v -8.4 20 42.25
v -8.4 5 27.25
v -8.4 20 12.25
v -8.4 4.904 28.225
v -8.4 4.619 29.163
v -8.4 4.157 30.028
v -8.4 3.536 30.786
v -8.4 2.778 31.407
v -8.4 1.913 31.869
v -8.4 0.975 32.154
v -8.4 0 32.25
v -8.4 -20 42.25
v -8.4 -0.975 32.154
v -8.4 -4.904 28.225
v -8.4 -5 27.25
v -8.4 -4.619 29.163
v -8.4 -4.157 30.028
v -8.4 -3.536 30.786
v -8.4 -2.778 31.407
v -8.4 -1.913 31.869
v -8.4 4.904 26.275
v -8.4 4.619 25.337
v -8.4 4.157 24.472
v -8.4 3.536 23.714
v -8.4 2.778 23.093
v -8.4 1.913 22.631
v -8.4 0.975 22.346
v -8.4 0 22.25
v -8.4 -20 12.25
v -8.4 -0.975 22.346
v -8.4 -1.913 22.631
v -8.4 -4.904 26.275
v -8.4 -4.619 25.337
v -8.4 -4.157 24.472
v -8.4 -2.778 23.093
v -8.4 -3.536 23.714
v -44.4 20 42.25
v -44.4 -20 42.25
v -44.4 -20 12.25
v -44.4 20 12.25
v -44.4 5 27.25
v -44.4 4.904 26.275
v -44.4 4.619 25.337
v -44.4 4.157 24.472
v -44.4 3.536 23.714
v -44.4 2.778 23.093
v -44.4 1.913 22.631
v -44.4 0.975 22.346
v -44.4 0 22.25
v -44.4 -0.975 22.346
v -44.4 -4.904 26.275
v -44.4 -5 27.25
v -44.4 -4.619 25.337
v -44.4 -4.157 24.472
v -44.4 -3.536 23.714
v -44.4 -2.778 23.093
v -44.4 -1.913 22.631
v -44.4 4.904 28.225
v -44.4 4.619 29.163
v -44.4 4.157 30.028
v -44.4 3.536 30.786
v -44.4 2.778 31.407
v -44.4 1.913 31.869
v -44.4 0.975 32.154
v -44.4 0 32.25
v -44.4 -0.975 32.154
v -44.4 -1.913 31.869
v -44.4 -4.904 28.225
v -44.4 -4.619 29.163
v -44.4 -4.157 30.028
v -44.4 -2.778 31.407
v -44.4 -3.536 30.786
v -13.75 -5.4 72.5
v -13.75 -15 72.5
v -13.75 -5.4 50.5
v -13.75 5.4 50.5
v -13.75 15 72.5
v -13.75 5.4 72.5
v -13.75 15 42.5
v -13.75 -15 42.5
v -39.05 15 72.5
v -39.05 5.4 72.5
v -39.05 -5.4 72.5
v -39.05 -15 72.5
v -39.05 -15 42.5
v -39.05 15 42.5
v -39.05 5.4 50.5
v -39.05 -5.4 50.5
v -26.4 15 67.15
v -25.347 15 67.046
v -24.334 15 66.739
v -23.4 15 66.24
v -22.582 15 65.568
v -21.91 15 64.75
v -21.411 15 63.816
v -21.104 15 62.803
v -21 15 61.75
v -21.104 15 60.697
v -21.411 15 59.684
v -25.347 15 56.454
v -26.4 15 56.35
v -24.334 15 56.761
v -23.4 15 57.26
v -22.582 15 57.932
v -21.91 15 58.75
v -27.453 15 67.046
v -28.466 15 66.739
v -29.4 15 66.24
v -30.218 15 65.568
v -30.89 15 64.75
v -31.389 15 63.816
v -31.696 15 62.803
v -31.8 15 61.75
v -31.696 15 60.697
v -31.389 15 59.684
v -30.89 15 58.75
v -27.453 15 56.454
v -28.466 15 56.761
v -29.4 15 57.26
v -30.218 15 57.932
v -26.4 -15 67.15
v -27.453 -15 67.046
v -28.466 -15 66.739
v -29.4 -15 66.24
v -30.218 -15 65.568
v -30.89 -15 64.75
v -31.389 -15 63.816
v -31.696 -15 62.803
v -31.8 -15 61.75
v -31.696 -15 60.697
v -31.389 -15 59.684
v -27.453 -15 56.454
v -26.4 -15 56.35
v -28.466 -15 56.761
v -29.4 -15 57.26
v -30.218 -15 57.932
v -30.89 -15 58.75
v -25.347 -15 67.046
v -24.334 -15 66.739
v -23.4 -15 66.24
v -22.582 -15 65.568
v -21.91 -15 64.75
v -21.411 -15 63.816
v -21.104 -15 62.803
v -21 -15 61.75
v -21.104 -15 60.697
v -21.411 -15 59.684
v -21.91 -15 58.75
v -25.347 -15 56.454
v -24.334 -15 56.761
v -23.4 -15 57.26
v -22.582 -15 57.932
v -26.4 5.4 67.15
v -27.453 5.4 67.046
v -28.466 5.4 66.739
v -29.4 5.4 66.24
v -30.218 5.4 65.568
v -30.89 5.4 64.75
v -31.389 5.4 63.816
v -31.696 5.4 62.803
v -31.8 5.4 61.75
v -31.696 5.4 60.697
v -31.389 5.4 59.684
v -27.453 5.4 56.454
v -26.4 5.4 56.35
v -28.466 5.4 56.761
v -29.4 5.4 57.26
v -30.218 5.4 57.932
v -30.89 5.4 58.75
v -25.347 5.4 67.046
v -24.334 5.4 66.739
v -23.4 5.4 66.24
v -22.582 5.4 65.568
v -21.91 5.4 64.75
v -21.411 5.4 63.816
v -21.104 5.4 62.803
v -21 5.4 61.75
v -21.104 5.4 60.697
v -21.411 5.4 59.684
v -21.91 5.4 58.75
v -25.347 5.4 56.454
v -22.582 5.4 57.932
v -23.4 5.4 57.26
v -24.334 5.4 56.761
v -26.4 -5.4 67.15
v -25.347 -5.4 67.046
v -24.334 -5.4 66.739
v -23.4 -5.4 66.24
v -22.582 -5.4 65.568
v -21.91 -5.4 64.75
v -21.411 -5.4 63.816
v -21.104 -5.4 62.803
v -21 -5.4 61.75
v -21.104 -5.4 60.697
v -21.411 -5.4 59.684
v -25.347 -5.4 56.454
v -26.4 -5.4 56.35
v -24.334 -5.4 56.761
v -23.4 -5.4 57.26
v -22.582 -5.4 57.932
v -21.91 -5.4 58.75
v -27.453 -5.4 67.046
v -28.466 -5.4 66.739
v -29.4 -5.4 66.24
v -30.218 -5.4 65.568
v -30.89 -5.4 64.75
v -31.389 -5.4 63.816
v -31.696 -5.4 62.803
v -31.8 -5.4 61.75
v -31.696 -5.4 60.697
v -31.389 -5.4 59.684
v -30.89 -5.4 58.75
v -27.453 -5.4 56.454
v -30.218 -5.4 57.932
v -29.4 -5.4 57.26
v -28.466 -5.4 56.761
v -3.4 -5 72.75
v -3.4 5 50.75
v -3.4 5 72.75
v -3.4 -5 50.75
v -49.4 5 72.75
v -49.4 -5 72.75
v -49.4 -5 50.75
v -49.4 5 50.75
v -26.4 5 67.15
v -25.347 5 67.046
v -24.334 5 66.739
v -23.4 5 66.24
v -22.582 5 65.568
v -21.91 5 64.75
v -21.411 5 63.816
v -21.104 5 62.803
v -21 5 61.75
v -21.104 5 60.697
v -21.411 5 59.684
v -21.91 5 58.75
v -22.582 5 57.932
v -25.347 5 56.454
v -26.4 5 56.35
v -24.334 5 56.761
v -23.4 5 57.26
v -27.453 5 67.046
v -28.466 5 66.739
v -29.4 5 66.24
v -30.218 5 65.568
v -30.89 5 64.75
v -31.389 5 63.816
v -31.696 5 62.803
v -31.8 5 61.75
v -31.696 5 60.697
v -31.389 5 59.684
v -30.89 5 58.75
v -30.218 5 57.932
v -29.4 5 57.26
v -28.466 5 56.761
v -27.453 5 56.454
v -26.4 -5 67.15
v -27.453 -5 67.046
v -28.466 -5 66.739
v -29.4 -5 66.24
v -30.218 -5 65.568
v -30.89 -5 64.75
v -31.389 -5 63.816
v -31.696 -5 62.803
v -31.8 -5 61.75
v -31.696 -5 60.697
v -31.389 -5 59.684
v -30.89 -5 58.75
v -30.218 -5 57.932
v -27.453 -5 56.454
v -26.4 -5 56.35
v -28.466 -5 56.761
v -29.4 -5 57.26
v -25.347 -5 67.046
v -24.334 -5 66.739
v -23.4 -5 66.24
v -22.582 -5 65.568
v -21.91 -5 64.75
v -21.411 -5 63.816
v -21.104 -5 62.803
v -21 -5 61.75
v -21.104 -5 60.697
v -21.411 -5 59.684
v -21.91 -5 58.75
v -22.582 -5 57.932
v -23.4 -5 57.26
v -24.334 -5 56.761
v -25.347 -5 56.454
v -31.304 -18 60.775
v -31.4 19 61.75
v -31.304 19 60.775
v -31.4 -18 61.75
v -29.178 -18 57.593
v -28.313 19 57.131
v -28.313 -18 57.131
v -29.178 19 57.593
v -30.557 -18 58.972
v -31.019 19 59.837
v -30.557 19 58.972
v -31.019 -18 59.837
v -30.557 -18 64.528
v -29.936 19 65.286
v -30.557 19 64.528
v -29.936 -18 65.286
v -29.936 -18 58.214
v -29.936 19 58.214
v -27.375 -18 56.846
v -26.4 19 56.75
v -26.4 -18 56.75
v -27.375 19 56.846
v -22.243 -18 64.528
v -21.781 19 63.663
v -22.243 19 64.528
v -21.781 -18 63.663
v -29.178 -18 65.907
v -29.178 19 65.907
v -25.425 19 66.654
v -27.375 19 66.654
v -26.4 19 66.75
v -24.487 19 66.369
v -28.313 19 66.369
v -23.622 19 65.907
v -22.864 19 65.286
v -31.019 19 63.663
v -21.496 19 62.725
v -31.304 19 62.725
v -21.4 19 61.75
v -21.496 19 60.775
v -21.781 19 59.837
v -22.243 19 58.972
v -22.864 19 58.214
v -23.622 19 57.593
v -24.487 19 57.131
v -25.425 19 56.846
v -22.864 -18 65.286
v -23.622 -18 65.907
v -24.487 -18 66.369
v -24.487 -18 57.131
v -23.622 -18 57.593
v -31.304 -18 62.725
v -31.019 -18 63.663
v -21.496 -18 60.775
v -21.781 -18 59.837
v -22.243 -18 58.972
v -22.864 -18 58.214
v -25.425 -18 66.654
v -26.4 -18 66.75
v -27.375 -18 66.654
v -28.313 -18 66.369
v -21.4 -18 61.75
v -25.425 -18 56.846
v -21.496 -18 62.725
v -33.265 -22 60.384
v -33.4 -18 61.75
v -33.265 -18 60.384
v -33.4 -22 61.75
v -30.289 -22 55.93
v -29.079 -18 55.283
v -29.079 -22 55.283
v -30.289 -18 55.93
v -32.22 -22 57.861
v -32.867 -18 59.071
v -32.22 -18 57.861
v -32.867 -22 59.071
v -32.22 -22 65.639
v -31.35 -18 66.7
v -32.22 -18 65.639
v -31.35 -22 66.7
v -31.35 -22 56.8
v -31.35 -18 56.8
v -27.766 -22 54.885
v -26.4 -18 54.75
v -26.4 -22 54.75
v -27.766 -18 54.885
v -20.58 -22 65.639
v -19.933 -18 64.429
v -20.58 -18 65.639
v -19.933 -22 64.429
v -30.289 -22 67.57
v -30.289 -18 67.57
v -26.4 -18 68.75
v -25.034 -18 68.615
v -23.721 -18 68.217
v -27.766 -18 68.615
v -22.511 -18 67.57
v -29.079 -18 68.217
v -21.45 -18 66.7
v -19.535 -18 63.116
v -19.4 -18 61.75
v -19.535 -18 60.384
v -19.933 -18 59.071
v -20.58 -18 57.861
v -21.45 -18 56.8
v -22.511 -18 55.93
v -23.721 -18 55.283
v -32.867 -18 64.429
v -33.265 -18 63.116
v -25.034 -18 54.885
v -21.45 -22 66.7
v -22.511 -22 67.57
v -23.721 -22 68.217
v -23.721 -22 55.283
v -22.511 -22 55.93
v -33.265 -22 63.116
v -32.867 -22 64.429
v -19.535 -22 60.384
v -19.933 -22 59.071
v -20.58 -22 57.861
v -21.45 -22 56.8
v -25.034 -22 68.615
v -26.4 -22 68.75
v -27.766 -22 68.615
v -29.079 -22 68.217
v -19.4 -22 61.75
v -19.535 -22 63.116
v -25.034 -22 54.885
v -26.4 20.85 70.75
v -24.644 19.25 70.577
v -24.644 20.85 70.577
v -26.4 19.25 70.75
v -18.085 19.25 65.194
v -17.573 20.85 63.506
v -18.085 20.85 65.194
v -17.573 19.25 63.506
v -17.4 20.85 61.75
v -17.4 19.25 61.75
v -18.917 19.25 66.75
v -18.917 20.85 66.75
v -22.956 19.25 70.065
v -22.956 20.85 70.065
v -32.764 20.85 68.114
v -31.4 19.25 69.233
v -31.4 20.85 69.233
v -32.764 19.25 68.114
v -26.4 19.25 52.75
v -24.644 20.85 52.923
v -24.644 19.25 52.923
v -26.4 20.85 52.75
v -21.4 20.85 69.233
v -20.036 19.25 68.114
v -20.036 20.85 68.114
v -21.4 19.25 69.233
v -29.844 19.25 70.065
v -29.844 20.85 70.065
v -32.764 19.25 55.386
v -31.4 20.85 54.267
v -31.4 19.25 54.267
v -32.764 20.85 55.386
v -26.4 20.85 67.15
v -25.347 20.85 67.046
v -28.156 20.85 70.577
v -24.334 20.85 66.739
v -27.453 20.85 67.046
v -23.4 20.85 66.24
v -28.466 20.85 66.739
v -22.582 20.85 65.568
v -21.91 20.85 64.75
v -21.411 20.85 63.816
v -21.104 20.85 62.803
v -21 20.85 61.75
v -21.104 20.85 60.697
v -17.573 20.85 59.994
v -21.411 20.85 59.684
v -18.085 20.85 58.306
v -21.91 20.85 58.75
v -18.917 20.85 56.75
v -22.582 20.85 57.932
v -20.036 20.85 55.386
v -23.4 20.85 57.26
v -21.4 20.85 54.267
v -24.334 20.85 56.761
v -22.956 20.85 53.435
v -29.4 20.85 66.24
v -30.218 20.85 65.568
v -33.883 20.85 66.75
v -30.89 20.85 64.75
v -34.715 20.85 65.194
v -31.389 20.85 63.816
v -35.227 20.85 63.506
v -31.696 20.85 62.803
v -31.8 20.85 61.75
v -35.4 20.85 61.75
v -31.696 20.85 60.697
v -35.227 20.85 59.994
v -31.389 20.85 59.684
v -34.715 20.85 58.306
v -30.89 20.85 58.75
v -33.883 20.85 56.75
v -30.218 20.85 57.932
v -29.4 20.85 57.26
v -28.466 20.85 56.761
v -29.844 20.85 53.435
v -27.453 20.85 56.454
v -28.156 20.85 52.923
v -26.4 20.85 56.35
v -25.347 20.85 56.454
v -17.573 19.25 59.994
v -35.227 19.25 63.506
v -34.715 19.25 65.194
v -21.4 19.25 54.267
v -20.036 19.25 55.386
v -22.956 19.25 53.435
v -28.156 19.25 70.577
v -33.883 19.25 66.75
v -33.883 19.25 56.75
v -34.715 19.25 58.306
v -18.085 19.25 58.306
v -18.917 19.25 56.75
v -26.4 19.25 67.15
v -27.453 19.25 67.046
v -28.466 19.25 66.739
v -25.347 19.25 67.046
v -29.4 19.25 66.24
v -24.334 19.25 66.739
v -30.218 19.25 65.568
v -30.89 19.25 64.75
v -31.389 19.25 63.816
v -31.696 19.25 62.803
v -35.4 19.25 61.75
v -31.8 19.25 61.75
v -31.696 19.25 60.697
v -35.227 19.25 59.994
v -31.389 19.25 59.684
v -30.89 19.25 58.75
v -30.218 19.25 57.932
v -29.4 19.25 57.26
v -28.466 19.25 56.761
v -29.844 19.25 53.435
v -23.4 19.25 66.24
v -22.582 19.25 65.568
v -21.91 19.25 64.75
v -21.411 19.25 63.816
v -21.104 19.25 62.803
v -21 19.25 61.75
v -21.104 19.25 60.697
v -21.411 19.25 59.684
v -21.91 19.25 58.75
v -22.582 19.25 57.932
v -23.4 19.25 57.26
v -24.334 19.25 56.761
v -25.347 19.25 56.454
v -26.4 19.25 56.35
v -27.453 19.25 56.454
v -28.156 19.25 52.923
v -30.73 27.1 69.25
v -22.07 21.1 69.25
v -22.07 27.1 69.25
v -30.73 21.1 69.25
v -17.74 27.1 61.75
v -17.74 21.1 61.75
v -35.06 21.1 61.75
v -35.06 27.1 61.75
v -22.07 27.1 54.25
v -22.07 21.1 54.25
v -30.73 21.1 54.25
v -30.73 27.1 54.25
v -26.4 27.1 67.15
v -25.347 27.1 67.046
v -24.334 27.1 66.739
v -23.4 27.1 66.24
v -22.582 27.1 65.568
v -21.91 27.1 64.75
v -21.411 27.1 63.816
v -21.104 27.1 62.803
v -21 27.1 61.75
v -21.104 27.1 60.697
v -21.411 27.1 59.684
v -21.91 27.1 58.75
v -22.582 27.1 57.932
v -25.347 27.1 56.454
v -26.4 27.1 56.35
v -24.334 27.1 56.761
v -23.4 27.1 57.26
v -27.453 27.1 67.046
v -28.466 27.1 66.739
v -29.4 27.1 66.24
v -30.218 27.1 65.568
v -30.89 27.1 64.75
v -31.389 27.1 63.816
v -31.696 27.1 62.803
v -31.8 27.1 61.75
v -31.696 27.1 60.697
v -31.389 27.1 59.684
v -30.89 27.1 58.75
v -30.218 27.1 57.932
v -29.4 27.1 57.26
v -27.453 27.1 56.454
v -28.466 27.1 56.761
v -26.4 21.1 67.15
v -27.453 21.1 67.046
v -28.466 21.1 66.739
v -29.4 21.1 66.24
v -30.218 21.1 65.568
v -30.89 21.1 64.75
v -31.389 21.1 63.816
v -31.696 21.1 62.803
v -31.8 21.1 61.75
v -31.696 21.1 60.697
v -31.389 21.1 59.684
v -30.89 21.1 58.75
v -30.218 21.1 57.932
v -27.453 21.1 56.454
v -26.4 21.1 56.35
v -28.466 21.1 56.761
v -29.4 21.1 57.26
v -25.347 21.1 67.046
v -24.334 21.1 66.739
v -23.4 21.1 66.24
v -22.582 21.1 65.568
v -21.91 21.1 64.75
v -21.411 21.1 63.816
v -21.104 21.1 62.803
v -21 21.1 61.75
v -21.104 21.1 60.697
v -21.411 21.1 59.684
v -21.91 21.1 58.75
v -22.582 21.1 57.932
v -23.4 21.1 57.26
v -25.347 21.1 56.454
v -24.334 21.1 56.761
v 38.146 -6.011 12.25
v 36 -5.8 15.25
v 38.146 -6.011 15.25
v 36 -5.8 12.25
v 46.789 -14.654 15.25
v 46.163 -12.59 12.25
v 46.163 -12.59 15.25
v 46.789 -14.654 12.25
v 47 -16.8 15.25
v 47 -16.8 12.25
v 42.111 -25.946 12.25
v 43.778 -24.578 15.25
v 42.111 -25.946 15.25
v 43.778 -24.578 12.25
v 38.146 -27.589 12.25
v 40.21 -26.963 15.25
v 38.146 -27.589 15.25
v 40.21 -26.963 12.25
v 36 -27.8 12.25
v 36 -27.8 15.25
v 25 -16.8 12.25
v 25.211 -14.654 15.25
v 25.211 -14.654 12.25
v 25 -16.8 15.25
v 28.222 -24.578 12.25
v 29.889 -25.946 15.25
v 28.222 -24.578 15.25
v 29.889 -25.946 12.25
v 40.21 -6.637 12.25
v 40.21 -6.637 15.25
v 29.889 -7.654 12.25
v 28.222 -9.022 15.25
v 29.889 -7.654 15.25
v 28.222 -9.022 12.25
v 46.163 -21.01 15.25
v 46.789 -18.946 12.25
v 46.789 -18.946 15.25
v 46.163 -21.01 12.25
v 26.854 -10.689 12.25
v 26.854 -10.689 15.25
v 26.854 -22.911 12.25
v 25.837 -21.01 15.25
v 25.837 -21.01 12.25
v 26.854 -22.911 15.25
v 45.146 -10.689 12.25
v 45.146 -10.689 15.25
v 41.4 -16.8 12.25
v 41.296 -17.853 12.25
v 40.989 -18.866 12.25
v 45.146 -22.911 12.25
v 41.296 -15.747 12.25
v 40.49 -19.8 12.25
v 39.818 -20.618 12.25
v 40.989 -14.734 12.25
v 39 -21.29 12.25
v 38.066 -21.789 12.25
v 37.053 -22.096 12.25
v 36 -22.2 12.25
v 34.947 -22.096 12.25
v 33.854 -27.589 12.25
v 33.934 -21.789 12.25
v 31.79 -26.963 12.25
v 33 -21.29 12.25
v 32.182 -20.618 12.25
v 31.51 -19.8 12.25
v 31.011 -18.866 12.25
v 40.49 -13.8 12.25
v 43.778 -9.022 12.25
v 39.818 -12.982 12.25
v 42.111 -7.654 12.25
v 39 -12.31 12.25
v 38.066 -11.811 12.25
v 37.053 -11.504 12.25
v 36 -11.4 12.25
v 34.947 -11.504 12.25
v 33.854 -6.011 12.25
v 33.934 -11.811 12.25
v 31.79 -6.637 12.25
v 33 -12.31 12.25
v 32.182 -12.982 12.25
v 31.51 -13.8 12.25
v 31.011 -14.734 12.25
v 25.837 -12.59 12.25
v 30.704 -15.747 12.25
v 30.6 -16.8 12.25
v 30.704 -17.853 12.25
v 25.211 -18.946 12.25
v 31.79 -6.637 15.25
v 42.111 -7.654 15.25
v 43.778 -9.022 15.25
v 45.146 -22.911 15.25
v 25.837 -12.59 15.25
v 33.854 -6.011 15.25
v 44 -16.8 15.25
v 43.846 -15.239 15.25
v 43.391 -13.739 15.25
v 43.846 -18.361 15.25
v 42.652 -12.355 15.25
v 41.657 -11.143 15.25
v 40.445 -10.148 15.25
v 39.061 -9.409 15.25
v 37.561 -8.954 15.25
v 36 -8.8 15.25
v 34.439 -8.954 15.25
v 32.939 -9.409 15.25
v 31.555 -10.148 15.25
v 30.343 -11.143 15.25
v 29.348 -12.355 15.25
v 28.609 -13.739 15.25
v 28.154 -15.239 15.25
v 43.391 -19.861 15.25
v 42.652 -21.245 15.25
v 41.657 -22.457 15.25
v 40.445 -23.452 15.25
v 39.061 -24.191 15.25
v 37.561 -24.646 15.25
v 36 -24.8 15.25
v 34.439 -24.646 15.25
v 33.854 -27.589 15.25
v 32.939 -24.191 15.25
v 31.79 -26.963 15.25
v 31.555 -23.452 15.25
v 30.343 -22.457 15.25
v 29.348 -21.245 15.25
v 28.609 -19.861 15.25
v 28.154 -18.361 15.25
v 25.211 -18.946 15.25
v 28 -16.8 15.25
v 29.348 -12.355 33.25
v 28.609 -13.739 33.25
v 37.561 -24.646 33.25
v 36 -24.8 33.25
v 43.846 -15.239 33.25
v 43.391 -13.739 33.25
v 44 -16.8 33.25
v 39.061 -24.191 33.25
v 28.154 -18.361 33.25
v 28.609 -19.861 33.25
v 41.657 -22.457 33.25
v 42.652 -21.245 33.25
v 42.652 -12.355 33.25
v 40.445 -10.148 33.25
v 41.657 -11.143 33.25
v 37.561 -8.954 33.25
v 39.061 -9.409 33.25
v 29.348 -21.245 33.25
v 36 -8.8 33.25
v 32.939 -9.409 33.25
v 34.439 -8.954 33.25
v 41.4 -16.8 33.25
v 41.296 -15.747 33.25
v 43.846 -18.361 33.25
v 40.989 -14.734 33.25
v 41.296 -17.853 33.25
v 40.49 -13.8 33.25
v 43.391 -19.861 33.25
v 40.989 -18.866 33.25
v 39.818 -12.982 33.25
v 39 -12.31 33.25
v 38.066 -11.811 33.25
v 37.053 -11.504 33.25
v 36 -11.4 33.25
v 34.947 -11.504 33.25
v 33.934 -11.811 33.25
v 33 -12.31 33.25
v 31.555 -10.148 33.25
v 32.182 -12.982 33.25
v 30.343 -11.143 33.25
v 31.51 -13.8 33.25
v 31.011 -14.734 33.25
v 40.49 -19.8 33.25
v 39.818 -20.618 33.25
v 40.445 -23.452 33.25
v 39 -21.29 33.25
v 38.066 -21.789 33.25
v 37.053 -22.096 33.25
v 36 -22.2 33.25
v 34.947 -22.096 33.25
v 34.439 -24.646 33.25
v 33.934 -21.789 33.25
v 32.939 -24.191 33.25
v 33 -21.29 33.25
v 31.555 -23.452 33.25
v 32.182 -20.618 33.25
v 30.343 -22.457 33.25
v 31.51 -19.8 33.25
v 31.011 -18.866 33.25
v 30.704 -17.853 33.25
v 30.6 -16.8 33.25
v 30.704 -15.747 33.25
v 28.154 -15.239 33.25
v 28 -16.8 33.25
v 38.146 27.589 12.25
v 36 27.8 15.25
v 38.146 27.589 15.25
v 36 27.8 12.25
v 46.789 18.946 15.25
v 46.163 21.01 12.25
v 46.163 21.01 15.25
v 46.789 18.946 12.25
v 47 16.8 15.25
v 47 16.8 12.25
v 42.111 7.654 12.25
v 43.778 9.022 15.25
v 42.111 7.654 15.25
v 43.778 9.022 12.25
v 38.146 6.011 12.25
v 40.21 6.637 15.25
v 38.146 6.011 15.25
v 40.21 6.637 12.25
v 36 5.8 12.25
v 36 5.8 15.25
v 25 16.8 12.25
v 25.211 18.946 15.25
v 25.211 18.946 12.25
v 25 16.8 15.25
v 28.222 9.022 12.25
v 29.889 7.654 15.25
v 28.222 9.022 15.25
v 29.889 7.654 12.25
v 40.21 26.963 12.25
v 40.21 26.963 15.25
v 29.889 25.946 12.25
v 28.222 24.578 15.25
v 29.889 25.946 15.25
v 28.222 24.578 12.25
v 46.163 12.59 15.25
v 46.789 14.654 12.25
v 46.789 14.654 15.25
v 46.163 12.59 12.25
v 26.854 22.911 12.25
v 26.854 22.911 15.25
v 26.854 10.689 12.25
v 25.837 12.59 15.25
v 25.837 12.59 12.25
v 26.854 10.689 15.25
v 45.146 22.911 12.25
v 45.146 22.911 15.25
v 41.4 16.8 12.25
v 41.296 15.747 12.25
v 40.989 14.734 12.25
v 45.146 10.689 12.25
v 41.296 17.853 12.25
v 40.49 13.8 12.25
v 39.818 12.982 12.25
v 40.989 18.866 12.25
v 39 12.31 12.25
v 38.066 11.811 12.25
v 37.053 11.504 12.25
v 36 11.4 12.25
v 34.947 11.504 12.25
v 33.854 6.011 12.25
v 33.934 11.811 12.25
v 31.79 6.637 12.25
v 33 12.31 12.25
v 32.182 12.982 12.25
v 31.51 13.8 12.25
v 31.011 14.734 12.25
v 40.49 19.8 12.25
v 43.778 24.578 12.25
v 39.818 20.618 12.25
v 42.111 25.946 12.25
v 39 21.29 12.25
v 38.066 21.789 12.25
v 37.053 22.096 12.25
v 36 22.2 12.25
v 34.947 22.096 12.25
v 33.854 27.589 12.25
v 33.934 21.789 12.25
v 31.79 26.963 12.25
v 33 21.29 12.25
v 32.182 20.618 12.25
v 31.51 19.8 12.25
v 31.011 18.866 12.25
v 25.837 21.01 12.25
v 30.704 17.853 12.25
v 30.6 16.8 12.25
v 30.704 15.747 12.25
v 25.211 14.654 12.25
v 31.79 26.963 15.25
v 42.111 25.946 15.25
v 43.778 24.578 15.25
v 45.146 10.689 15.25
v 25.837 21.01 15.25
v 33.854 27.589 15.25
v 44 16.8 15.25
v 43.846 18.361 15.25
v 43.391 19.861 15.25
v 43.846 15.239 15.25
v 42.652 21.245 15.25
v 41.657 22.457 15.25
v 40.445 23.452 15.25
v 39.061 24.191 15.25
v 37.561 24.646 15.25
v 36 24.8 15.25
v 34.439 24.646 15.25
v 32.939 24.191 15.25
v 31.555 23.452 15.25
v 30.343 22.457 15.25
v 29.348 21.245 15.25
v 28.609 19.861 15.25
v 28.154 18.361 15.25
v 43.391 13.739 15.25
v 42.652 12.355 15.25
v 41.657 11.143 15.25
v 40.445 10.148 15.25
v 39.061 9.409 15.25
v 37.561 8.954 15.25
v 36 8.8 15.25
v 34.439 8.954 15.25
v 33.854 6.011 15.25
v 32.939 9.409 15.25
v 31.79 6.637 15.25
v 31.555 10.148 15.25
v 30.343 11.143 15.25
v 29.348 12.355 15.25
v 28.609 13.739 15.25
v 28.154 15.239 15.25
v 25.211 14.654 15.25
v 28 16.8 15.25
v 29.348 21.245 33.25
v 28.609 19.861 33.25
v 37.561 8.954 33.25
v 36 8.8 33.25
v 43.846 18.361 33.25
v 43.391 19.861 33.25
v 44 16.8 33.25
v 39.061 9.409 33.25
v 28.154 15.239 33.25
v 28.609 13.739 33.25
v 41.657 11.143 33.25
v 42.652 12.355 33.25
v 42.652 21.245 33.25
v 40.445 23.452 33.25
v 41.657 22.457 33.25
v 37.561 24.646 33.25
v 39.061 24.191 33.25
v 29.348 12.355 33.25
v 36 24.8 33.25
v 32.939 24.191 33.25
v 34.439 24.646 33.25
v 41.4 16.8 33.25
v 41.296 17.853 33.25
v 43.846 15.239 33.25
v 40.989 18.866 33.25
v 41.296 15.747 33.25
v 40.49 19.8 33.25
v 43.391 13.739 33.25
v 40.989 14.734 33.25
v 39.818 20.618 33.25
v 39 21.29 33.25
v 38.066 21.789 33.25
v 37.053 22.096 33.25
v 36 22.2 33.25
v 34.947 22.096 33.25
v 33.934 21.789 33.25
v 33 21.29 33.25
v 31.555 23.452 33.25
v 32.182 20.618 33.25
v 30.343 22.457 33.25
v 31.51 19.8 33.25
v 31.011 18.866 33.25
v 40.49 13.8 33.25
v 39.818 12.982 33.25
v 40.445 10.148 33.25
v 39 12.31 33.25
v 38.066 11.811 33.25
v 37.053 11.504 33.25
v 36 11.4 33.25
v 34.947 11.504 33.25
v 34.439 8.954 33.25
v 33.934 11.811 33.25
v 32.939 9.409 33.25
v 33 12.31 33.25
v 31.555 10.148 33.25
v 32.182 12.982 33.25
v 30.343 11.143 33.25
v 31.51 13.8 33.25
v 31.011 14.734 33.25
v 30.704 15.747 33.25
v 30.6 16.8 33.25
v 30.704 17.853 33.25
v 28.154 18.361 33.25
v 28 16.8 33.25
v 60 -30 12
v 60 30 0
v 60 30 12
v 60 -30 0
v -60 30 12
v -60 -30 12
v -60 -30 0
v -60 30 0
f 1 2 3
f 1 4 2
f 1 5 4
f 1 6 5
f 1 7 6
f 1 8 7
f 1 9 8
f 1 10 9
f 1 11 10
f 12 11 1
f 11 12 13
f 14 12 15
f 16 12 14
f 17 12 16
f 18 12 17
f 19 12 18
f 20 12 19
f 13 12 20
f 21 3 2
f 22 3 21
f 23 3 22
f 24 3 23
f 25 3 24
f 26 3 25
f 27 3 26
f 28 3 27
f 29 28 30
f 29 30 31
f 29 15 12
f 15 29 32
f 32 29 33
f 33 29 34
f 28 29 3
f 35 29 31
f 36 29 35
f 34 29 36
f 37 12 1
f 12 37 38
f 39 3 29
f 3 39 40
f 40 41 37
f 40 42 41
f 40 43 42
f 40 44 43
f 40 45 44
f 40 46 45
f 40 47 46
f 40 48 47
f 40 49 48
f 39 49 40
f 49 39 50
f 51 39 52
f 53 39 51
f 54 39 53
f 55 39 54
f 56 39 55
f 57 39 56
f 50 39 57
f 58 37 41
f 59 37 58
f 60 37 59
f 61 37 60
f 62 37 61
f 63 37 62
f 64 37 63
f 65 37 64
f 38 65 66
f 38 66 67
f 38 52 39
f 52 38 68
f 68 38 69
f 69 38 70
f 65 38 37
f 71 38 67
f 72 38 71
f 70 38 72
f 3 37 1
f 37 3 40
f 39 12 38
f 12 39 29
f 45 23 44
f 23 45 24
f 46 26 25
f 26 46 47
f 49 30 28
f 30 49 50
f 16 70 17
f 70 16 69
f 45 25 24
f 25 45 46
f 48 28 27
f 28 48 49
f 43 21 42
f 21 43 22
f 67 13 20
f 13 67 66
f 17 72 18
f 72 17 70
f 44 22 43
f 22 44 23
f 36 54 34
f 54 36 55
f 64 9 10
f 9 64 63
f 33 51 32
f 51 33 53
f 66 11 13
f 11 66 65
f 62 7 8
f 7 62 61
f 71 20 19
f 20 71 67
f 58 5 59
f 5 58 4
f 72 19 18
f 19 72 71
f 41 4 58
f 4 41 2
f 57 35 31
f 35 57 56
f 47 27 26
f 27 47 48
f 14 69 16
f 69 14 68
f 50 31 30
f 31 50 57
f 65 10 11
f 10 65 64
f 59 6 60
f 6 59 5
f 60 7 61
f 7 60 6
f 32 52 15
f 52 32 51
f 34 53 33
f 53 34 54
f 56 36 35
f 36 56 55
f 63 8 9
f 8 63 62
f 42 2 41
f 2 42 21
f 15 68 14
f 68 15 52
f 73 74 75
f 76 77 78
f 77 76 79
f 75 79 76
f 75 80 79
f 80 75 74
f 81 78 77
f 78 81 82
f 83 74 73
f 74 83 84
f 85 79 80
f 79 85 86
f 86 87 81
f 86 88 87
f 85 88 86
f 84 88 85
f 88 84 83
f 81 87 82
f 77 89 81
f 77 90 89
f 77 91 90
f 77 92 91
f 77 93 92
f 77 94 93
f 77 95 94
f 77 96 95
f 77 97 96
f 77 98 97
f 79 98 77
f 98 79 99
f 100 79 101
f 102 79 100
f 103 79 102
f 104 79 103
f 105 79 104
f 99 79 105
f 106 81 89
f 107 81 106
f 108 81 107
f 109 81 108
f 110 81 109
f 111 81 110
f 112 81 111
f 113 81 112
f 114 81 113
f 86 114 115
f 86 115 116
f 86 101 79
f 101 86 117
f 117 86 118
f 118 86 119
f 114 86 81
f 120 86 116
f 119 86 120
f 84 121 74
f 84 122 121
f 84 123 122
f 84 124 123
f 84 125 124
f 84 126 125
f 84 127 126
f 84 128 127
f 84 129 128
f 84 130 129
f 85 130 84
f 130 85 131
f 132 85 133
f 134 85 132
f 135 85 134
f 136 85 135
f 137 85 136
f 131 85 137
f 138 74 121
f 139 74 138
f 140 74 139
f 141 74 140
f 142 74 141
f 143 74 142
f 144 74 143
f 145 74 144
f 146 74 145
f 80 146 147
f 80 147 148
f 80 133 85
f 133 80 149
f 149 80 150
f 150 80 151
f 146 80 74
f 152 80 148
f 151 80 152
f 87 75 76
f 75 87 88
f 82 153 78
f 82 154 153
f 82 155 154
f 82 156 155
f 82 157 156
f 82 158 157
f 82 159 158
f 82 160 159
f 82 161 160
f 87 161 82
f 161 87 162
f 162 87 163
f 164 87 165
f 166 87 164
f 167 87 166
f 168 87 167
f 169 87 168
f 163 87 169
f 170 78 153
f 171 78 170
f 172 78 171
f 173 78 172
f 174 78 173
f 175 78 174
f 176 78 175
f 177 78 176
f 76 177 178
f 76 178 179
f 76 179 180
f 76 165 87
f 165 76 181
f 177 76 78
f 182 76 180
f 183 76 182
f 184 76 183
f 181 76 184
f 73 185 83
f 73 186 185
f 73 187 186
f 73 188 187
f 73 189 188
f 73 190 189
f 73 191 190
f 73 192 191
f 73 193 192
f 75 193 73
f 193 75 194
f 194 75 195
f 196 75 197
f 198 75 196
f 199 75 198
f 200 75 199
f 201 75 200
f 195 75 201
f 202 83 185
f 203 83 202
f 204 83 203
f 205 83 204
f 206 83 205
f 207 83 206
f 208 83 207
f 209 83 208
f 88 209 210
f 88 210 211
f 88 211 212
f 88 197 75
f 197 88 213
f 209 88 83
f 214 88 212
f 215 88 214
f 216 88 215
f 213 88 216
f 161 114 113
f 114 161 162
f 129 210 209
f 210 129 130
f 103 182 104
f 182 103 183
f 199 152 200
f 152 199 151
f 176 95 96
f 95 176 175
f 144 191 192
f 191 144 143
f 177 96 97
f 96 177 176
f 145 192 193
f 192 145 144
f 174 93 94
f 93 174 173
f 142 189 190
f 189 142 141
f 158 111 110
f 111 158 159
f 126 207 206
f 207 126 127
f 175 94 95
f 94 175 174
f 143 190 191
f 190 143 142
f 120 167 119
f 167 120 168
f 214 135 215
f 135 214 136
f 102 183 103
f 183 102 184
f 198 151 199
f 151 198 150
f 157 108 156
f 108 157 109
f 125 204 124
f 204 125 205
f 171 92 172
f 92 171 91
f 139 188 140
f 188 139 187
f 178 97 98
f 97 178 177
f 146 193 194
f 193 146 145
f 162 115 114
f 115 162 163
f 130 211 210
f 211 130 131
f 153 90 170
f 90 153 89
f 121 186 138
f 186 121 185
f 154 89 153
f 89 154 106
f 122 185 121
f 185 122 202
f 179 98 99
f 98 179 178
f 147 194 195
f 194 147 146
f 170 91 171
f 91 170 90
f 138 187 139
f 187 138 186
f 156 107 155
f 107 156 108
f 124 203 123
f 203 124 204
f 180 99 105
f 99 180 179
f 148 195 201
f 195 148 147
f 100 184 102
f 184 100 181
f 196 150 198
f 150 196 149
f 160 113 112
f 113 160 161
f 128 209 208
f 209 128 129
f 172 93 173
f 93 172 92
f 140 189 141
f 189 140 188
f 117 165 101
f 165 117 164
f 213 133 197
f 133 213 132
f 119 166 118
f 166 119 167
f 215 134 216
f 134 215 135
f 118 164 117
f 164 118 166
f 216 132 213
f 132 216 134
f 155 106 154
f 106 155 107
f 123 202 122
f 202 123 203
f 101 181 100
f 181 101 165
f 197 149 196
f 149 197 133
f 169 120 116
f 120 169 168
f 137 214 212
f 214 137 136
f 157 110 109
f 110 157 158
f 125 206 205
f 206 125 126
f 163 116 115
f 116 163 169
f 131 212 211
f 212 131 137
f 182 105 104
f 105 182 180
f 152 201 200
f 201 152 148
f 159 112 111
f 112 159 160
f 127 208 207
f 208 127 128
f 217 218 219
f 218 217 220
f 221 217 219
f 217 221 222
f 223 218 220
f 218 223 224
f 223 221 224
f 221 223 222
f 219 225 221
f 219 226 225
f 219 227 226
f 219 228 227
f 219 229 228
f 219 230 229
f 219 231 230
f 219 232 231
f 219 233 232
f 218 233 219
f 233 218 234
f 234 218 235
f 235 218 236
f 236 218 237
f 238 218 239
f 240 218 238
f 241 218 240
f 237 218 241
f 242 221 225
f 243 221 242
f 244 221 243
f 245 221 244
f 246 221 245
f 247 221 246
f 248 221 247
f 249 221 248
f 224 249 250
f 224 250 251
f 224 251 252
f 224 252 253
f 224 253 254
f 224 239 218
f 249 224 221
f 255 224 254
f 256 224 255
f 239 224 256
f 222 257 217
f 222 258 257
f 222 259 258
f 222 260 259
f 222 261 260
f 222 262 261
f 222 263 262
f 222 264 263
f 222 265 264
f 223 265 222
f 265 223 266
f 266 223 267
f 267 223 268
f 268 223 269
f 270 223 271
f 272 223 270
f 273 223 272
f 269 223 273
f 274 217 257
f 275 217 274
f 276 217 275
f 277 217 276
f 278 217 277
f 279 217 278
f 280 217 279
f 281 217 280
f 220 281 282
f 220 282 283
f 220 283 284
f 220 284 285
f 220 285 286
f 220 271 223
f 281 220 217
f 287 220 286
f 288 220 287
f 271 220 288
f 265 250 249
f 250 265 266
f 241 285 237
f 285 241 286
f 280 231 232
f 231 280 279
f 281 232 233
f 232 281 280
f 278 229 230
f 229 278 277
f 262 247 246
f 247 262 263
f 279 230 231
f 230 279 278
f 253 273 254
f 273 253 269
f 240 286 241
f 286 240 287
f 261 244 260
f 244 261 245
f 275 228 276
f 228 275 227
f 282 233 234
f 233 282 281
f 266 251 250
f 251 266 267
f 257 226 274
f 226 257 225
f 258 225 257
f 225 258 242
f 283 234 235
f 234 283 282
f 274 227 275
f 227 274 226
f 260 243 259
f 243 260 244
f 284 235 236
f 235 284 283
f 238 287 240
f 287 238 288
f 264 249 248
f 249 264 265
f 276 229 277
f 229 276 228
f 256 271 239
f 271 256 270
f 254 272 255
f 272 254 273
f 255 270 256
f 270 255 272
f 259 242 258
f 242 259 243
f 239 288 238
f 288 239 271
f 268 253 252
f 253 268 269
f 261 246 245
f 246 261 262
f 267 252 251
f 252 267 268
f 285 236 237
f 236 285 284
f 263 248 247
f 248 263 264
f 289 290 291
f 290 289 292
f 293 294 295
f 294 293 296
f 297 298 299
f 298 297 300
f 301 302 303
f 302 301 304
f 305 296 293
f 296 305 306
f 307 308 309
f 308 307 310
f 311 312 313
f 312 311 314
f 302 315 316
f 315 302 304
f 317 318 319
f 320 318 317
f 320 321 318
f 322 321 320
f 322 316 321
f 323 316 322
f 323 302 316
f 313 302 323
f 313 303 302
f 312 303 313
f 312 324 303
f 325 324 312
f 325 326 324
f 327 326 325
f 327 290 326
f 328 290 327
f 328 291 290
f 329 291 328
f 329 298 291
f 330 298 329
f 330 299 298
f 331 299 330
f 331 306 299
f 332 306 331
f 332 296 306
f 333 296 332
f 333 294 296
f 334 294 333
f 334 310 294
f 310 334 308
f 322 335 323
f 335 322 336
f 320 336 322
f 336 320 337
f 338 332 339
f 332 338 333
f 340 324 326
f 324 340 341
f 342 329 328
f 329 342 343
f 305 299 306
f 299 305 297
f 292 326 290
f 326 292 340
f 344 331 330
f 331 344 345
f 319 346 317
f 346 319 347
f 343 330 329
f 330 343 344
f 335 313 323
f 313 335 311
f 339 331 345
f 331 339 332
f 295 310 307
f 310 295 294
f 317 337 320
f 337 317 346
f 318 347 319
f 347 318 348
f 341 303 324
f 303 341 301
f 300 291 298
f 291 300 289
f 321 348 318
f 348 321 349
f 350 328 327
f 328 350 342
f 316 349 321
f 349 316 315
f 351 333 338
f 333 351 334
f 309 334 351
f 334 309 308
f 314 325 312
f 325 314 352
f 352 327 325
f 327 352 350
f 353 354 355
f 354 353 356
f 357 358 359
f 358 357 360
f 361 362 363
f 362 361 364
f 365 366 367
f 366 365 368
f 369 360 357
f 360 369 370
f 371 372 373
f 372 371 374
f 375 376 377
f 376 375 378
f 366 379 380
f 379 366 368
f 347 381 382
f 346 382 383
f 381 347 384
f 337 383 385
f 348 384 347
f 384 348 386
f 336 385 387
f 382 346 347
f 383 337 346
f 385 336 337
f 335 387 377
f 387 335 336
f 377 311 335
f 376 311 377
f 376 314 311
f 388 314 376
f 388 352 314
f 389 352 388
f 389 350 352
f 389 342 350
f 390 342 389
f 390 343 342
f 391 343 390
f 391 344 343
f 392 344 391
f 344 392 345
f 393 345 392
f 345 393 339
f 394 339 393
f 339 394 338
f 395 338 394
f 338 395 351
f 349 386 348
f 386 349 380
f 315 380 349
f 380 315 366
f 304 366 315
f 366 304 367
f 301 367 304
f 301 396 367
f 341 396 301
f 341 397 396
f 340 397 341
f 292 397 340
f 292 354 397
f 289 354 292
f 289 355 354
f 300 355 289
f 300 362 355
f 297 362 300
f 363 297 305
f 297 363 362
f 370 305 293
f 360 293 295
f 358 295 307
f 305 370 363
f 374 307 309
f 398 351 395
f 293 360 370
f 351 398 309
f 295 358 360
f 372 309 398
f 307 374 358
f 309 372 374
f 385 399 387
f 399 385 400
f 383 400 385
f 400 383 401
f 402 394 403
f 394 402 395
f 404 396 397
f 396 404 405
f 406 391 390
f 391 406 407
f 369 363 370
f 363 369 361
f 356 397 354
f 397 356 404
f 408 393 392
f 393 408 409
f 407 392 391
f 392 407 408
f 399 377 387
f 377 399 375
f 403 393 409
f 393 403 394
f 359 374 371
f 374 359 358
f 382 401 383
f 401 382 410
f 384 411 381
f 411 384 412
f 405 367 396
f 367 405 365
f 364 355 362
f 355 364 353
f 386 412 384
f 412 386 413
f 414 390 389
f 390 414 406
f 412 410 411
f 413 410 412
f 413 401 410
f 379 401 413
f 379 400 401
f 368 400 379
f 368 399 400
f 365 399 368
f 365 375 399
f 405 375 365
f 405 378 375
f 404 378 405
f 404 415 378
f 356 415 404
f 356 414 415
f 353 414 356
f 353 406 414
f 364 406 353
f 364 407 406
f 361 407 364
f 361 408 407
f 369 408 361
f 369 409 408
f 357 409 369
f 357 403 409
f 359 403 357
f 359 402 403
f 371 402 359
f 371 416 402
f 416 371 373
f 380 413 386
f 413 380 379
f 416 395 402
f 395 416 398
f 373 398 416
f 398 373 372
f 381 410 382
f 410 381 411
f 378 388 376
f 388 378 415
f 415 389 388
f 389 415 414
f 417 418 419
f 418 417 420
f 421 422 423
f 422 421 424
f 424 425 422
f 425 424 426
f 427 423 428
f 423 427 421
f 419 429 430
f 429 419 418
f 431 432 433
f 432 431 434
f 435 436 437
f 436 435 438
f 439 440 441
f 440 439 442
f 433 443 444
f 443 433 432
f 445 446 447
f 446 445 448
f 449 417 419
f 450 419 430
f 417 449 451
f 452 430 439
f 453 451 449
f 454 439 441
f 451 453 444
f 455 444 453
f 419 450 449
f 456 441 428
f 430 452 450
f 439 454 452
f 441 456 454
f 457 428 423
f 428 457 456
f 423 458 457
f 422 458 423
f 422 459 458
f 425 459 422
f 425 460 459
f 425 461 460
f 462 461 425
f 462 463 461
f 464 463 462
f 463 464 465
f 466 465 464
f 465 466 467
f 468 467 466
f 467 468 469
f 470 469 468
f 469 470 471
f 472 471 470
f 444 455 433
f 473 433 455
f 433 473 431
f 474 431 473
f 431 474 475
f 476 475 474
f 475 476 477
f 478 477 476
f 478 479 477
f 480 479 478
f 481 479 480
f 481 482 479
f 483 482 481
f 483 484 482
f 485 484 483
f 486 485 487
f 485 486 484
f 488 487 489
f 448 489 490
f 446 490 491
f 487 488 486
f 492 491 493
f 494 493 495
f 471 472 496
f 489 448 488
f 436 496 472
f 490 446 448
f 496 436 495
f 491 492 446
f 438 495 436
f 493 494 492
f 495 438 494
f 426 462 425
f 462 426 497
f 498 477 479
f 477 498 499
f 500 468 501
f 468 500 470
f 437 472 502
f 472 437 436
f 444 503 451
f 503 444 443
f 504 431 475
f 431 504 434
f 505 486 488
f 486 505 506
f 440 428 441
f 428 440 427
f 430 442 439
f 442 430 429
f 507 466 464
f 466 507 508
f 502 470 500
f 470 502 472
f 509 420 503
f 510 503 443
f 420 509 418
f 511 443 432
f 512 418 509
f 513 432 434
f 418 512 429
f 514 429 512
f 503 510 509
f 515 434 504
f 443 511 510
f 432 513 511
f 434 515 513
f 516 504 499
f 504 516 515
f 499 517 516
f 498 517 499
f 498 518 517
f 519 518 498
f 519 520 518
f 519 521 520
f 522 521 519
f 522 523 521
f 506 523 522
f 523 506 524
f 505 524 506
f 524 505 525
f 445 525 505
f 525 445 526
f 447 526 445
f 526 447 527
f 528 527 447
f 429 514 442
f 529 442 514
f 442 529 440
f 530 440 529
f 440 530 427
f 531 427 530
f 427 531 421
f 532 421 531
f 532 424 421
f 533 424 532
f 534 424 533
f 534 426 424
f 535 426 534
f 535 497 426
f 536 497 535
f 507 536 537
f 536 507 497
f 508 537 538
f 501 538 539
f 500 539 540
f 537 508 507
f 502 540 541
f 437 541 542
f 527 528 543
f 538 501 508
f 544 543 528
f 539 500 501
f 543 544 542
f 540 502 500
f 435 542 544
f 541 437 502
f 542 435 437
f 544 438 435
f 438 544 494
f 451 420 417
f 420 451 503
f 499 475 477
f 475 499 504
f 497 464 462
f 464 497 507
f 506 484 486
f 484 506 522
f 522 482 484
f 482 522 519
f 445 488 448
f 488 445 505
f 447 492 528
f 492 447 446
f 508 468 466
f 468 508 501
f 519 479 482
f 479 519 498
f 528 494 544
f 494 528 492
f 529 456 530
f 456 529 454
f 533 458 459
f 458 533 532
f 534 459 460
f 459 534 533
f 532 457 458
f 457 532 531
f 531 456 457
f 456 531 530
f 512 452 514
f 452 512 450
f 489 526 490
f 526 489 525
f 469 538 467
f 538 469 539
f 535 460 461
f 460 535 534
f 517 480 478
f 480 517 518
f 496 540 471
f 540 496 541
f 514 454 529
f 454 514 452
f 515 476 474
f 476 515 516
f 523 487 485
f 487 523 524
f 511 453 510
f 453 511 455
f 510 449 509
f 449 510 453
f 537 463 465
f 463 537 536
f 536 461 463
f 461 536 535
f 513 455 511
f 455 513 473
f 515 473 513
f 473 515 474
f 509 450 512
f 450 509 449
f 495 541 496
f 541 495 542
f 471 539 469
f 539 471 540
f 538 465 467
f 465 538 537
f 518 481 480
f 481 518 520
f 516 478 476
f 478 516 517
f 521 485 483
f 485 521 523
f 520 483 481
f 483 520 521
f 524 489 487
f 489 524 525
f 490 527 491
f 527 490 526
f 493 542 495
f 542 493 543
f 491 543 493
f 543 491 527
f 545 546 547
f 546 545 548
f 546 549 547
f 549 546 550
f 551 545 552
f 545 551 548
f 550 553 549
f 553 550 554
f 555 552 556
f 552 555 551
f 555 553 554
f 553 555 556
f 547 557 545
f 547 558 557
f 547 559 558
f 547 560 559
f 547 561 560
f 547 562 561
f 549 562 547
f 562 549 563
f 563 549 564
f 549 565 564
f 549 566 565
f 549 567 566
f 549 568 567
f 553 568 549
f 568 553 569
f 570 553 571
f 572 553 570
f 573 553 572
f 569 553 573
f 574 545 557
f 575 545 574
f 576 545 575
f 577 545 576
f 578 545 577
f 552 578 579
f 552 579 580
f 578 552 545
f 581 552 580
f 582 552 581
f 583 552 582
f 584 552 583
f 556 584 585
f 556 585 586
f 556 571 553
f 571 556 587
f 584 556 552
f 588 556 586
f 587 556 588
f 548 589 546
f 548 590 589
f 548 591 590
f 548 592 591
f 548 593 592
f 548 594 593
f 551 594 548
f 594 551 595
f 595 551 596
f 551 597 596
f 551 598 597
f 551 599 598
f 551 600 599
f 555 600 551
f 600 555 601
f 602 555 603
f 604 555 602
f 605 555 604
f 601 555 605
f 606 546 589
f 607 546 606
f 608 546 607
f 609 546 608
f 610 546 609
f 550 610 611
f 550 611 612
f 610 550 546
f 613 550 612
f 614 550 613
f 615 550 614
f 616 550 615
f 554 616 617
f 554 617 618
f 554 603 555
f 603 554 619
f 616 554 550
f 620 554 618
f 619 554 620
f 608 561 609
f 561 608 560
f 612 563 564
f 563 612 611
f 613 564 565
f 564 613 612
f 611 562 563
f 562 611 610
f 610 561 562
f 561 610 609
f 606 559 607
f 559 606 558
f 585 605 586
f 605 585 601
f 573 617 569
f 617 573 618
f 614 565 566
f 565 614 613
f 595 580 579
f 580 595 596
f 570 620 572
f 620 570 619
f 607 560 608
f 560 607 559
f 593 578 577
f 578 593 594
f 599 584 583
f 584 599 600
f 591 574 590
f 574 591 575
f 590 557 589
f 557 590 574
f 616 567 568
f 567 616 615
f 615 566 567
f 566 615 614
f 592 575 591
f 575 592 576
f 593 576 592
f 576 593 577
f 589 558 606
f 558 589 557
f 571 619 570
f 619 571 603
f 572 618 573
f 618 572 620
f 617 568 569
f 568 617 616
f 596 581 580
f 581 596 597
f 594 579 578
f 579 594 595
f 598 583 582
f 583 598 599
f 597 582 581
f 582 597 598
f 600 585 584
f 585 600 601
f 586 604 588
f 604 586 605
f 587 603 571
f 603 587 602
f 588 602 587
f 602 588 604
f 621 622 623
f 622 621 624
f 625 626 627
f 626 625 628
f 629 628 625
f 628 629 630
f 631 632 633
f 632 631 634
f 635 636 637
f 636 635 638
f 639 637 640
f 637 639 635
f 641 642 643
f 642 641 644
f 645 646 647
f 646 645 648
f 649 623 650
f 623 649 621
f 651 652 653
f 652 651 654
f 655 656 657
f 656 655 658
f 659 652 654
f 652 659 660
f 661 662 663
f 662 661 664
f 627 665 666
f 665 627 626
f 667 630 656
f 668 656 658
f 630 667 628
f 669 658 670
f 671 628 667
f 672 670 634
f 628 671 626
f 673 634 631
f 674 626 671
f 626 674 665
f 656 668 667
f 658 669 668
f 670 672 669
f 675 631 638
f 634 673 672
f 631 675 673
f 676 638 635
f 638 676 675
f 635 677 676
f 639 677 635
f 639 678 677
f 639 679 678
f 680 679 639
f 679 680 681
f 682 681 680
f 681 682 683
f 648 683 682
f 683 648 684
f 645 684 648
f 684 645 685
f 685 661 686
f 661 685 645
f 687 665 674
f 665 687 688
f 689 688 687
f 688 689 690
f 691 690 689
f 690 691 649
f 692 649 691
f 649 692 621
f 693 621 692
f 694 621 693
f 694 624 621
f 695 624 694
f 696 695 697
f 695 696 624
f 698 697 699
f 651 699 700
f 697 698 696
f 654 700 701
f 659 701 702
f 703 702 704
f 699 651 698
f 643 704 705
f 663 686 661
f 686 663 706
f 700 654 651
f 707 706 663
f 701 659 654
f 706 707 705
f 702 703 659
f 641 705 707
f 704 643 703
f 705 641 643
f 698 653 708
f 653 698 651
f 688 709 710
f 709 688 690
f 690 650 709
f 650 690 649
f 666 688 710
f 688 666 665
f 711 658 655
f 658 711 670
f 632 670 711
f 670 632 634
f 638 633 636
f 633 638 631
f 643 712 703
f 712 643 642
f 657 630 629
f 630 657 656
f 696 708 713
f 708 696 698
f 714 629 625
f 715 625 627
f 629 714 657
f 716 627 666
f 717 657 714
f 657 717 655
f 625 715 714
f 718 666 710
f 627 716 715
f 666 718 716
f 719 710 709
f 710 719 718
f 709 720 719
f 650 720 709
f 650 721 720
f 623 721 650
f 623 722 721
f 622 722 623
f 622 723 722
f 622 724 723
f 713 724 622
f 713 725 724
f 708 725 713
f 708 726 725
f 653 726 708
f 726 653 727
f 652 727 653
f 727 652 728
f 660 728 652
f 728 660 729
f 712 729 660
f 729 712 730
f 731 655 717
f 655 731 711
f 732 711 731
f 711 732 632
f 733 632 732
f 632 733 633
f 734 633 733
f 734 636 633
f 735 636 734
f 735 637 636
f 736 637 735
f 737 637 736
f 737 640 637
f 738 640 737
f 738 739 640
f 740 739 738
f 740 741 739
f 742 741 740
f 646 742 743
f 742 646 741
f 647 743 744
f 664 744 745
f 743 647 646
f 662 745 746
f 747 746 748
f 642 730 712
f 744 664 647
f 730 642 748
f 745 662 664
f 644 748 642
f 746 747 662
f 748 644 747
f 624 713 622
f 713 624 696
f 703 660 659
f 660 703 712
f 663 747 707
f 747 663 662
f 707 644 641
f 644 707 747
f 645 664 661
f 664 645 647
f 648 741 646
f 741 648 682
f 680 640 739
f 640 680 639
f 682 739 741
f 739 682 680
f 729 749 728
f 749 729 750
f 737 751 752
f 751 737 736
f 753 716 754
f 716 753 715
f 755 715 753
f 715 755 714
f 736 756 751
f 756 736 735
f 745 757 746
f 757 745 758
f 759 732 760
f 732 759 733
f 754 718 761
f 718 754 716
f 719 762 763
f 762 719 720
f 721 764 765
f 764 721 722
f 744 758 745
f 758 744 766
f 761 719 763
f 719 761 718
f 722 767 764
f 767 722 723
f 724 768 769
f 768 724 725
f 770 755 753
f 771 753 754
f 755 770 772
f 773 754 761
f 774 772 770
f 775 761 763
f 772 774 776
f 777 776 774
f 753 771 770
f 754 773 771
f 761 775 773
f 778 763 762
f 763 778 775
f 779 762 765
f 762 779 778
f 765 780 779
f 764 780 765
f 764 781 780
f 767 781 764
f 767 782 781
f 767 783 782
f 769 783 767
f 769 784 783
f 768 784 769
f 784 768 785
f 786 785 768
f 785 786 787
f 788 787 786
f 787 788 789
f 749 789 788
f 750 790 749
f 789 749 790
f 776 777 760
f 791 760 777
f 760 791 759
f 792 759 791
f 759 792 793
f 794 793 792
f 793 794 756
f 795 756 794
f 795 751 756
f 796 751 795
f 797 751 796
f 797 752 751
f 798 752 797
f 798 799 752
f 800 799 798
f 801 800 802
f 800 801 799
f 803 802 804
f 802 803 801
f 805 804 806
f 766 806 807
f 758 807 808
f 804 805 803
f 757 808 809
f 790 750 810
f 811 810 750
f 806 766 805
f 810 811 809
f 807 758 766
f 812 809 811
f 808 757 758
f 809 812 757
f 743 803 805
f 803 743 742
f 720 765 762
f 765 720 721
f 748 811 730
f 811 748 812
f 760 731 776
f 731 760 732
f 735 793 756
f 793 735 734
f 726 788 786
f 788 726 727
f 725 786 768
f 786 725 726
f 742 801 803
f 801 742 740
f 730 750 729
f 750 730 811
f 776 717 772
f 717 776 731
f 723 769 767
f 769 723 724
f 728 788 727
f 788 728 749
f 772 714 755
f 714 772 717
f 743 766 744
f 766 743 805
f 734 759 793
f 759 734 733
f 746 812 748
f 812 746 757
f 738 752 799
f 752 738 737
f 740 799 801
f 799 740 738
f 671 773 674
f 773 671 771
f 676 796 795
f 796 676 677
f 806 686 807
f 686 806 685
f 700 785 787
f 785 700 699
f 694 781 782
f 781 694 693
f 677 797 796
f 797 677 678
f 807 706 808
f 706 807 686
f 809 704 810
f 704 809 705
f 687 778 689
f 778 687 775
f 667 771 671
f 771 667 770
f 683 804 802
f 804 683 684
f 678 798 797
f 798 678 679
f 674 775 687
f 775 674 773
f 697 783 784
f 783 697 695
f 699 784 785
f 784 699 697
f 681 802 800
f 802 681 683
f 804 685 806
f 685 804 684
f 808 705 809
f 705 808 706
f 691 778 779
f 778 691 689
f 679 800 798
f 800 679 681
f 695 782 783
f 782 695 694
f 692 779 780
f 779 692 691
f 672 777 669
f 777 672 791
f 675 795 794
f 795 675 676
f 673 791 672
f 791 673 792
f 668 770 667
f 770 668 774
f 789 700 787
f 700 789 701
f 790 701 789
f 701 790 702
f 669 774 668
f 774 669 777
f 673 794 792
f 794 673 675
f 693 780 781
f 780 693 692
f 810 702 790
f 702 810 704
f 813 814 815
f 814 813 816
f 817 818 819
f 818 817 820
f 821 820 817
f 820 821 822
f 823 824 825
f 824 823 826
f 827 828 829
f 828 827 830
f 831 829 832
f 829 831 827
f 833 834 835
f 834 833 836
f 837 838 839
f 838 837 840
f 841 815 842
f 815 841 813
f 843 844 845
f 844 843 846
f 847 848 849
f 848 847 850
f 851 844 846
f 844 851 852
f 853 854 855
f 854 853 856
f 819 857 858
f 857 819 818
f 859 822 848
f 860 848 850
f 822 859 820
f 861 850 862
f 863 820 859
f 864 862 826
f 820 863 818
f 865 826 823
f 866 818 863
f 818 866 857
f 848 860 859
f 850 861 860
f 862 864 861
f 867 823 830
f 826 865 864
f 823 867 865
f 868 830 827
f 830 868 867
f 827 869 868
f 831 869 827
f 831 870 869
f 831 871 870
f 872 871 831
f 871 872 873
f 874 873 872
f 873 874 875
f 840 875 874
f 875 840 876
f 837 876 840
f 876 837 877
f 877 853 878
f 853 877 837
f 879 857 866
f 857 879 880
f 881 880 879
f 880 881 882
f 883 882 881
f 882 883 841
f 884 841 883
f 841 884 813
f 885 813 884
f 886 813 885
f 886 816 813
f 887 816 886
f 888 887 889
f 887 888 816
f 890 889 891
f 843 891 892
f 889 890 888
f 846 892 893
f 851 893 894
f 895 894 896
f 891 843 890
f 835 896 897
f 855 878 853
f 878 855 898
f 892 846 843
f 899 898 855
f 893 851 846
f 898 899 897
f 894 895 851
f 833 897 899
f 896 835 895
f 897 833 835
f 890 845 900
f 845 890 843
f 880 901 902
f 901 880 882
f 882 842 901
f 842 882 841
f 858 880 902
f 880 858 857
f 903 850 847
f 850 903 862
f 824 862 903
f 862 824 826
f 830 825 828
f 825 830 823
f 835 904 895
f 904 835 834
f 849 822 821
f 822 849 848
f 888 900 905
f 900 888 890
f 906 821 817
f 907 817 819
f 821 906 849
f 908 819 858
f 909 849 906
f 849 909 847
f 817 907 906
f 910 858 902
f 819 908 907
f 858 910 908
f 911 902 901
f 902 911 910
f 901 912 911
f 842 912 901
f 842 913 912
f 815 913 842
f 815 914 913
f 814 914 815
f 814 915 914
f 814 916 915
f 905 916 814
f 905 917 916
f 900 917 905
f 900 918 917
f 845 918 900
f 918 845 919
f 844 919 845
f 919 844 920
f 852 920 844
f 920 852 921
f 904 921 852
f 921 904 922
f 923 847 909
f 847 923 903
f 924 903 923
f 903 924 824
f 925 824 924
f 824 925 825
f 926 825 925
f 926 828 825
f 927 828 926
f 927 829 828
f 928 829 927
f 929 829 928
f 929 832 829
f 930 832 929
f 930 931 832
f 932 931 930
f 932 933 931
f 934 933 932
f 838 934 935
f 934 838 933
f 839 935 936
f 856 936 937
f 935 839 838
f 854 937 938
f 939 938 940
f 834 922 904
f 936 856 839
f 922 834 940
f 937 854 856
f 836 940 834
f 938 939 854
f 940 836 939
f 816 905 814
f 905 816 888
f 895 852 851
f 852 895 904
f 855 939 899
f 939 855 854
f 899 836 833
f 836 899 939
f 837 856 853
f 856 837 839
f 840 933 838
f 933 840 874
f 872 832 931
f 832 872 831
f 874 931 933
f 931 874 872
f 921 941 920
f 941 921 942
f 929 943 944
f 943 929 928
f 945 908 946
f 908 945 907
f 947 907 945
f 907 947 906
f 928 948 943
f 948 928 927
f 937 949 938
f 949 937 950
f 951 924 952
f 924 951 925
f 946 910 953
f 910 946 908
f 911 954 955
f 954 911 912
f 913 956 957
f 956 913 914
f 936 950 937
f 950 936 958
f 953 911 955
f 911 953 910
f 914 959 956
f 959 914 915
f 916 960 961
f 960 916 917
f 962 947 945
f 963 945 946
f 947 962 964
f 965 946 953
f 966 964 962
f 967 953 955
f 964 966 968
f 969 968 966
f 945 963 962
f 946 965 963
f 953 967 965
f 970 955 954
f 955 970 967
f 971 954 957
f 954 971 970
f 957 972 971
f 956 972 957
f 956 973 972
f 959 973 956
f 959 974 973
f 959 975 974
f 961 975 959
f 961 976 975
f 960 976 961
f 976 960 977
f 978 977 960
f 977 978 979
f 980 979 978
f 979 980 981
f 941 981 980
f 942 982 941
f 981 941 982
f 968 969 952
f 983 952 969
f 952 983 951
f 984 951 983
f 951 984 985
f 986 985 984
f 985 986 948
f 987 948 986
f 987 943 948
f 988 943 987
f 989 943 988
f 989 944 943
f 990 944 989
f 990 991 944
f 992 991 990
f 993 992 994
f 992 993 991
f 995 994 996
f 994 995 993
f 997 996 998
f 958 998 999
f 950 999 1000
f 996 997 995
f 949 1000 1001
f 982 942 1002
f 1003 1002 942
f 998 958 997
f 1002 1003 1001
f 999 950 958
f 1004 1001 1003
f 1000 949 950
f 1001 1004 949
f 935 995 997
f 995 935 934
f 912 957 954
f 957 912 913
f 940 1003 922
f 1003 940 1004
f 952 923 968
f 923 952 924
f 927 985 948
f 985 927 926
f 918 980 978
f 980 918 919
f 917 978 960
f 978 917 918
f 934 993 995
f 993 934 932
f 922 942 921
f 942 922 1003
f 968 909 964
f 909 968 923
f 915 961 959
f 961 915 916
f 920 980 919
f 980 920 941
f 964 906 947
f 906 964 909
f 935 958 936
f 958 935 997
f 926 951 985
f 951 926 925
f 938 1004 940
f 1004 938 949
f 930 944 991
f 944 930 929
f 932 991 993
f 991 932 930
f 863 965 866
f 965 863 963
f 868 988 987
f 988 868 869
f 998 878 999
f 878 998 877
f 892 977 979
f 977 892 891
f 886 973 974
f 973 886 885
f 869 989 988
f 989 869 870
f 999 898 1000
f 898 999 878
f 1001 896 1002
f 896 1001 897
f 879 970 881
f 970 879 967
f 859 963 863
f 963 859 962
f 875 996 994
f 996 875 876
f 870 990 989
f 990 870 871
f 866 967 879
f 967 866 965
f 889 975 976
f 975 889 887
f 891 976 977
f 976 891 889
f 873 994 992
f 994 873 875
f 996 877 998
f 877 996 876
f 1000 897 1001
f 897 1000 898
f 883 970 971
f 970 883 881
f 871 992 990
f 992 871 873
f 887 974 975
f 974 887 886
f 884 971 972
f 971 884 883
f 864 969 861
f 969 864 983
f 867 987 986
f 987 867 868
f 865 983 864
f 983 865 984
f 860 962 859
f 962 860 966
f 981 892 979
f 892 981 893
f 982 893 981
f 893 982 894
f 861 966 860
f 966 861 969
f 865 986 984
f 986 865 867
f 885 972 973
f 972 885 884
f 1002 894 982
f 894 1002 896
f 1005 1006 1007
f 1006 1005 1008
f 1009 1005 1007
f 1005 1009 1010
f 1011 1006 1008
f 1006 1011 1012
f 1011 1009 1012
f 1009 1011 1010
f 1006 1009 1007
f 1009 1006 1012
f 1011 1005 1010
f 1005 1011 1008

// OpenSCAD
$fn = 32;

// ------------------------------------------------------------------------
// Indexing jig: plate 120 x 60 mm, pin d10
// Every part is its own module, assembly() places every instance.
// ------------------------------------------------------------------------

// --- part 1 ---
module jig_plate() {
  difference() {
    translate([-60, -30, 0]) cube([120, 60, 12]);
  }
}

// --- part 2 ---
module locator_block() {
  difference() {
    translate([-18, -20, 0]) cube([36, 40, 30]);
    translate([0, 0, 15]) rotate([0, 90, 0]) cylinder(h = 38, d = 10, center = true);
  }
}

// --- part 3 ---
module index_fork() {
  difference() {
    translate([-12.65, -15, 0]) cube([25.3, 30, 30]);
    translate([-13.65, -5.4, 8]) cube([27.3, 10.8, 23]);
    translate([0, 0, 19.25]) rotate([90, 0, 0]) cylinder(h = 32, d = 10.8, center = true);
  }
}

// --- part 4 ---
module index_arm() {
  difference() {
    translate([-23, -5, 0]) cube([46, 10, 22]);
    translate([0, 0, 11]) rotate([90, 0, 0]) cylinder(h = 12, d = 10.8, center = true);
  }
}

// --- part 5 ---
module index_pin() {
  rotate([0, 90, 0]) cylinder(h = 38, d = 10, center = true);
  translate([-22, 0, 0]) rotate([0, 90, 0]) cylinder(h = 4, d = 14);
}

// --- part 6 ---
module pin_washer() {
  difference() {
      translate([0, 0, 0]) cylinder(h = 1.6, d = 18);
      translate([0, 0, -1]) cylinder(h = 3.6, d = 10.8);
    }
}

// --- part 7 ---
module lock_nut() {
  difference() {
    linear_extrude(height = 6) polygon(points = [[8.66, 0], [4.33, 7.5], [-4.33, 7.5], [-8.66, 0], [-4.33, -7.5], [4.33, -7.5]]);
    translate([0, 0, -1]) cylinder(h = 8, d = 10.8);
  }
}

// --- part 8 ---
module guide_bush_a() {
  difference() {
    union() {
      cylinder(h = 3, d = 22);
      translate([0, 0, 3]) cylinder(h = 18, d = 16);
    }
    translate([0, 0, -1]) cylinder(h = 23, d = 10.8);
  }
}

// --- part 9 ---
module guide_bush_b() {
  difference() {
    union() {
      cylinder(h = 3, d = 22);
      translate([0, 0, 3]) cylinder(h = 18, d = 16);
    }
    translate([0, 0, -1]) cylinder(h = 23, d = 10.8);
  }
}

// --- assembly ---
module assembly() {
  color([0.80, 0.24, 0.20]) translate([0, 0, 0]) rotate([0, 0, 0]) jig_plate();
  color([0.20, 0.45, 0.75]) translate([-26.4, 0, 12.25]) rotate([0, 0, 0]) locator_block();
  color([0.25, 0.62, 0.32]) translate([-26.4, 0, 42.5]) rotate([0, 0, 0]) index_fork();
  color([0.92, 0.70, 0.18]) translate([-26.4, 0, 50.75]) rotate([0, 0, 0]) index_arm();
  color([0.58, 0.35, 0.70]) translate([-26.4, 0, 61.75]) rotate([0, 0, 90]) index_pin();
  color([0.16, 0.66, 0.66]) translate([-26.4, 20.85, 61.75]) rotate([90, 0, 0]) pin_washer();
  color([0.85, 0.48, 0.18]) translate([-26.4, 27.1, 61.75]) rotate([90, 0, 0]) lock_nut();
  color([0.55, 0.60, 0.65]) translate([36, -16.8, 12.25]) rotate([0, 0, 0]) guide_bush_a();
  color([0.75, 0.30, 0.55]) translate([36, 16.8, 12.25]) rotate([0, 0, 0]) guide_bush_b();
}

assembly();
